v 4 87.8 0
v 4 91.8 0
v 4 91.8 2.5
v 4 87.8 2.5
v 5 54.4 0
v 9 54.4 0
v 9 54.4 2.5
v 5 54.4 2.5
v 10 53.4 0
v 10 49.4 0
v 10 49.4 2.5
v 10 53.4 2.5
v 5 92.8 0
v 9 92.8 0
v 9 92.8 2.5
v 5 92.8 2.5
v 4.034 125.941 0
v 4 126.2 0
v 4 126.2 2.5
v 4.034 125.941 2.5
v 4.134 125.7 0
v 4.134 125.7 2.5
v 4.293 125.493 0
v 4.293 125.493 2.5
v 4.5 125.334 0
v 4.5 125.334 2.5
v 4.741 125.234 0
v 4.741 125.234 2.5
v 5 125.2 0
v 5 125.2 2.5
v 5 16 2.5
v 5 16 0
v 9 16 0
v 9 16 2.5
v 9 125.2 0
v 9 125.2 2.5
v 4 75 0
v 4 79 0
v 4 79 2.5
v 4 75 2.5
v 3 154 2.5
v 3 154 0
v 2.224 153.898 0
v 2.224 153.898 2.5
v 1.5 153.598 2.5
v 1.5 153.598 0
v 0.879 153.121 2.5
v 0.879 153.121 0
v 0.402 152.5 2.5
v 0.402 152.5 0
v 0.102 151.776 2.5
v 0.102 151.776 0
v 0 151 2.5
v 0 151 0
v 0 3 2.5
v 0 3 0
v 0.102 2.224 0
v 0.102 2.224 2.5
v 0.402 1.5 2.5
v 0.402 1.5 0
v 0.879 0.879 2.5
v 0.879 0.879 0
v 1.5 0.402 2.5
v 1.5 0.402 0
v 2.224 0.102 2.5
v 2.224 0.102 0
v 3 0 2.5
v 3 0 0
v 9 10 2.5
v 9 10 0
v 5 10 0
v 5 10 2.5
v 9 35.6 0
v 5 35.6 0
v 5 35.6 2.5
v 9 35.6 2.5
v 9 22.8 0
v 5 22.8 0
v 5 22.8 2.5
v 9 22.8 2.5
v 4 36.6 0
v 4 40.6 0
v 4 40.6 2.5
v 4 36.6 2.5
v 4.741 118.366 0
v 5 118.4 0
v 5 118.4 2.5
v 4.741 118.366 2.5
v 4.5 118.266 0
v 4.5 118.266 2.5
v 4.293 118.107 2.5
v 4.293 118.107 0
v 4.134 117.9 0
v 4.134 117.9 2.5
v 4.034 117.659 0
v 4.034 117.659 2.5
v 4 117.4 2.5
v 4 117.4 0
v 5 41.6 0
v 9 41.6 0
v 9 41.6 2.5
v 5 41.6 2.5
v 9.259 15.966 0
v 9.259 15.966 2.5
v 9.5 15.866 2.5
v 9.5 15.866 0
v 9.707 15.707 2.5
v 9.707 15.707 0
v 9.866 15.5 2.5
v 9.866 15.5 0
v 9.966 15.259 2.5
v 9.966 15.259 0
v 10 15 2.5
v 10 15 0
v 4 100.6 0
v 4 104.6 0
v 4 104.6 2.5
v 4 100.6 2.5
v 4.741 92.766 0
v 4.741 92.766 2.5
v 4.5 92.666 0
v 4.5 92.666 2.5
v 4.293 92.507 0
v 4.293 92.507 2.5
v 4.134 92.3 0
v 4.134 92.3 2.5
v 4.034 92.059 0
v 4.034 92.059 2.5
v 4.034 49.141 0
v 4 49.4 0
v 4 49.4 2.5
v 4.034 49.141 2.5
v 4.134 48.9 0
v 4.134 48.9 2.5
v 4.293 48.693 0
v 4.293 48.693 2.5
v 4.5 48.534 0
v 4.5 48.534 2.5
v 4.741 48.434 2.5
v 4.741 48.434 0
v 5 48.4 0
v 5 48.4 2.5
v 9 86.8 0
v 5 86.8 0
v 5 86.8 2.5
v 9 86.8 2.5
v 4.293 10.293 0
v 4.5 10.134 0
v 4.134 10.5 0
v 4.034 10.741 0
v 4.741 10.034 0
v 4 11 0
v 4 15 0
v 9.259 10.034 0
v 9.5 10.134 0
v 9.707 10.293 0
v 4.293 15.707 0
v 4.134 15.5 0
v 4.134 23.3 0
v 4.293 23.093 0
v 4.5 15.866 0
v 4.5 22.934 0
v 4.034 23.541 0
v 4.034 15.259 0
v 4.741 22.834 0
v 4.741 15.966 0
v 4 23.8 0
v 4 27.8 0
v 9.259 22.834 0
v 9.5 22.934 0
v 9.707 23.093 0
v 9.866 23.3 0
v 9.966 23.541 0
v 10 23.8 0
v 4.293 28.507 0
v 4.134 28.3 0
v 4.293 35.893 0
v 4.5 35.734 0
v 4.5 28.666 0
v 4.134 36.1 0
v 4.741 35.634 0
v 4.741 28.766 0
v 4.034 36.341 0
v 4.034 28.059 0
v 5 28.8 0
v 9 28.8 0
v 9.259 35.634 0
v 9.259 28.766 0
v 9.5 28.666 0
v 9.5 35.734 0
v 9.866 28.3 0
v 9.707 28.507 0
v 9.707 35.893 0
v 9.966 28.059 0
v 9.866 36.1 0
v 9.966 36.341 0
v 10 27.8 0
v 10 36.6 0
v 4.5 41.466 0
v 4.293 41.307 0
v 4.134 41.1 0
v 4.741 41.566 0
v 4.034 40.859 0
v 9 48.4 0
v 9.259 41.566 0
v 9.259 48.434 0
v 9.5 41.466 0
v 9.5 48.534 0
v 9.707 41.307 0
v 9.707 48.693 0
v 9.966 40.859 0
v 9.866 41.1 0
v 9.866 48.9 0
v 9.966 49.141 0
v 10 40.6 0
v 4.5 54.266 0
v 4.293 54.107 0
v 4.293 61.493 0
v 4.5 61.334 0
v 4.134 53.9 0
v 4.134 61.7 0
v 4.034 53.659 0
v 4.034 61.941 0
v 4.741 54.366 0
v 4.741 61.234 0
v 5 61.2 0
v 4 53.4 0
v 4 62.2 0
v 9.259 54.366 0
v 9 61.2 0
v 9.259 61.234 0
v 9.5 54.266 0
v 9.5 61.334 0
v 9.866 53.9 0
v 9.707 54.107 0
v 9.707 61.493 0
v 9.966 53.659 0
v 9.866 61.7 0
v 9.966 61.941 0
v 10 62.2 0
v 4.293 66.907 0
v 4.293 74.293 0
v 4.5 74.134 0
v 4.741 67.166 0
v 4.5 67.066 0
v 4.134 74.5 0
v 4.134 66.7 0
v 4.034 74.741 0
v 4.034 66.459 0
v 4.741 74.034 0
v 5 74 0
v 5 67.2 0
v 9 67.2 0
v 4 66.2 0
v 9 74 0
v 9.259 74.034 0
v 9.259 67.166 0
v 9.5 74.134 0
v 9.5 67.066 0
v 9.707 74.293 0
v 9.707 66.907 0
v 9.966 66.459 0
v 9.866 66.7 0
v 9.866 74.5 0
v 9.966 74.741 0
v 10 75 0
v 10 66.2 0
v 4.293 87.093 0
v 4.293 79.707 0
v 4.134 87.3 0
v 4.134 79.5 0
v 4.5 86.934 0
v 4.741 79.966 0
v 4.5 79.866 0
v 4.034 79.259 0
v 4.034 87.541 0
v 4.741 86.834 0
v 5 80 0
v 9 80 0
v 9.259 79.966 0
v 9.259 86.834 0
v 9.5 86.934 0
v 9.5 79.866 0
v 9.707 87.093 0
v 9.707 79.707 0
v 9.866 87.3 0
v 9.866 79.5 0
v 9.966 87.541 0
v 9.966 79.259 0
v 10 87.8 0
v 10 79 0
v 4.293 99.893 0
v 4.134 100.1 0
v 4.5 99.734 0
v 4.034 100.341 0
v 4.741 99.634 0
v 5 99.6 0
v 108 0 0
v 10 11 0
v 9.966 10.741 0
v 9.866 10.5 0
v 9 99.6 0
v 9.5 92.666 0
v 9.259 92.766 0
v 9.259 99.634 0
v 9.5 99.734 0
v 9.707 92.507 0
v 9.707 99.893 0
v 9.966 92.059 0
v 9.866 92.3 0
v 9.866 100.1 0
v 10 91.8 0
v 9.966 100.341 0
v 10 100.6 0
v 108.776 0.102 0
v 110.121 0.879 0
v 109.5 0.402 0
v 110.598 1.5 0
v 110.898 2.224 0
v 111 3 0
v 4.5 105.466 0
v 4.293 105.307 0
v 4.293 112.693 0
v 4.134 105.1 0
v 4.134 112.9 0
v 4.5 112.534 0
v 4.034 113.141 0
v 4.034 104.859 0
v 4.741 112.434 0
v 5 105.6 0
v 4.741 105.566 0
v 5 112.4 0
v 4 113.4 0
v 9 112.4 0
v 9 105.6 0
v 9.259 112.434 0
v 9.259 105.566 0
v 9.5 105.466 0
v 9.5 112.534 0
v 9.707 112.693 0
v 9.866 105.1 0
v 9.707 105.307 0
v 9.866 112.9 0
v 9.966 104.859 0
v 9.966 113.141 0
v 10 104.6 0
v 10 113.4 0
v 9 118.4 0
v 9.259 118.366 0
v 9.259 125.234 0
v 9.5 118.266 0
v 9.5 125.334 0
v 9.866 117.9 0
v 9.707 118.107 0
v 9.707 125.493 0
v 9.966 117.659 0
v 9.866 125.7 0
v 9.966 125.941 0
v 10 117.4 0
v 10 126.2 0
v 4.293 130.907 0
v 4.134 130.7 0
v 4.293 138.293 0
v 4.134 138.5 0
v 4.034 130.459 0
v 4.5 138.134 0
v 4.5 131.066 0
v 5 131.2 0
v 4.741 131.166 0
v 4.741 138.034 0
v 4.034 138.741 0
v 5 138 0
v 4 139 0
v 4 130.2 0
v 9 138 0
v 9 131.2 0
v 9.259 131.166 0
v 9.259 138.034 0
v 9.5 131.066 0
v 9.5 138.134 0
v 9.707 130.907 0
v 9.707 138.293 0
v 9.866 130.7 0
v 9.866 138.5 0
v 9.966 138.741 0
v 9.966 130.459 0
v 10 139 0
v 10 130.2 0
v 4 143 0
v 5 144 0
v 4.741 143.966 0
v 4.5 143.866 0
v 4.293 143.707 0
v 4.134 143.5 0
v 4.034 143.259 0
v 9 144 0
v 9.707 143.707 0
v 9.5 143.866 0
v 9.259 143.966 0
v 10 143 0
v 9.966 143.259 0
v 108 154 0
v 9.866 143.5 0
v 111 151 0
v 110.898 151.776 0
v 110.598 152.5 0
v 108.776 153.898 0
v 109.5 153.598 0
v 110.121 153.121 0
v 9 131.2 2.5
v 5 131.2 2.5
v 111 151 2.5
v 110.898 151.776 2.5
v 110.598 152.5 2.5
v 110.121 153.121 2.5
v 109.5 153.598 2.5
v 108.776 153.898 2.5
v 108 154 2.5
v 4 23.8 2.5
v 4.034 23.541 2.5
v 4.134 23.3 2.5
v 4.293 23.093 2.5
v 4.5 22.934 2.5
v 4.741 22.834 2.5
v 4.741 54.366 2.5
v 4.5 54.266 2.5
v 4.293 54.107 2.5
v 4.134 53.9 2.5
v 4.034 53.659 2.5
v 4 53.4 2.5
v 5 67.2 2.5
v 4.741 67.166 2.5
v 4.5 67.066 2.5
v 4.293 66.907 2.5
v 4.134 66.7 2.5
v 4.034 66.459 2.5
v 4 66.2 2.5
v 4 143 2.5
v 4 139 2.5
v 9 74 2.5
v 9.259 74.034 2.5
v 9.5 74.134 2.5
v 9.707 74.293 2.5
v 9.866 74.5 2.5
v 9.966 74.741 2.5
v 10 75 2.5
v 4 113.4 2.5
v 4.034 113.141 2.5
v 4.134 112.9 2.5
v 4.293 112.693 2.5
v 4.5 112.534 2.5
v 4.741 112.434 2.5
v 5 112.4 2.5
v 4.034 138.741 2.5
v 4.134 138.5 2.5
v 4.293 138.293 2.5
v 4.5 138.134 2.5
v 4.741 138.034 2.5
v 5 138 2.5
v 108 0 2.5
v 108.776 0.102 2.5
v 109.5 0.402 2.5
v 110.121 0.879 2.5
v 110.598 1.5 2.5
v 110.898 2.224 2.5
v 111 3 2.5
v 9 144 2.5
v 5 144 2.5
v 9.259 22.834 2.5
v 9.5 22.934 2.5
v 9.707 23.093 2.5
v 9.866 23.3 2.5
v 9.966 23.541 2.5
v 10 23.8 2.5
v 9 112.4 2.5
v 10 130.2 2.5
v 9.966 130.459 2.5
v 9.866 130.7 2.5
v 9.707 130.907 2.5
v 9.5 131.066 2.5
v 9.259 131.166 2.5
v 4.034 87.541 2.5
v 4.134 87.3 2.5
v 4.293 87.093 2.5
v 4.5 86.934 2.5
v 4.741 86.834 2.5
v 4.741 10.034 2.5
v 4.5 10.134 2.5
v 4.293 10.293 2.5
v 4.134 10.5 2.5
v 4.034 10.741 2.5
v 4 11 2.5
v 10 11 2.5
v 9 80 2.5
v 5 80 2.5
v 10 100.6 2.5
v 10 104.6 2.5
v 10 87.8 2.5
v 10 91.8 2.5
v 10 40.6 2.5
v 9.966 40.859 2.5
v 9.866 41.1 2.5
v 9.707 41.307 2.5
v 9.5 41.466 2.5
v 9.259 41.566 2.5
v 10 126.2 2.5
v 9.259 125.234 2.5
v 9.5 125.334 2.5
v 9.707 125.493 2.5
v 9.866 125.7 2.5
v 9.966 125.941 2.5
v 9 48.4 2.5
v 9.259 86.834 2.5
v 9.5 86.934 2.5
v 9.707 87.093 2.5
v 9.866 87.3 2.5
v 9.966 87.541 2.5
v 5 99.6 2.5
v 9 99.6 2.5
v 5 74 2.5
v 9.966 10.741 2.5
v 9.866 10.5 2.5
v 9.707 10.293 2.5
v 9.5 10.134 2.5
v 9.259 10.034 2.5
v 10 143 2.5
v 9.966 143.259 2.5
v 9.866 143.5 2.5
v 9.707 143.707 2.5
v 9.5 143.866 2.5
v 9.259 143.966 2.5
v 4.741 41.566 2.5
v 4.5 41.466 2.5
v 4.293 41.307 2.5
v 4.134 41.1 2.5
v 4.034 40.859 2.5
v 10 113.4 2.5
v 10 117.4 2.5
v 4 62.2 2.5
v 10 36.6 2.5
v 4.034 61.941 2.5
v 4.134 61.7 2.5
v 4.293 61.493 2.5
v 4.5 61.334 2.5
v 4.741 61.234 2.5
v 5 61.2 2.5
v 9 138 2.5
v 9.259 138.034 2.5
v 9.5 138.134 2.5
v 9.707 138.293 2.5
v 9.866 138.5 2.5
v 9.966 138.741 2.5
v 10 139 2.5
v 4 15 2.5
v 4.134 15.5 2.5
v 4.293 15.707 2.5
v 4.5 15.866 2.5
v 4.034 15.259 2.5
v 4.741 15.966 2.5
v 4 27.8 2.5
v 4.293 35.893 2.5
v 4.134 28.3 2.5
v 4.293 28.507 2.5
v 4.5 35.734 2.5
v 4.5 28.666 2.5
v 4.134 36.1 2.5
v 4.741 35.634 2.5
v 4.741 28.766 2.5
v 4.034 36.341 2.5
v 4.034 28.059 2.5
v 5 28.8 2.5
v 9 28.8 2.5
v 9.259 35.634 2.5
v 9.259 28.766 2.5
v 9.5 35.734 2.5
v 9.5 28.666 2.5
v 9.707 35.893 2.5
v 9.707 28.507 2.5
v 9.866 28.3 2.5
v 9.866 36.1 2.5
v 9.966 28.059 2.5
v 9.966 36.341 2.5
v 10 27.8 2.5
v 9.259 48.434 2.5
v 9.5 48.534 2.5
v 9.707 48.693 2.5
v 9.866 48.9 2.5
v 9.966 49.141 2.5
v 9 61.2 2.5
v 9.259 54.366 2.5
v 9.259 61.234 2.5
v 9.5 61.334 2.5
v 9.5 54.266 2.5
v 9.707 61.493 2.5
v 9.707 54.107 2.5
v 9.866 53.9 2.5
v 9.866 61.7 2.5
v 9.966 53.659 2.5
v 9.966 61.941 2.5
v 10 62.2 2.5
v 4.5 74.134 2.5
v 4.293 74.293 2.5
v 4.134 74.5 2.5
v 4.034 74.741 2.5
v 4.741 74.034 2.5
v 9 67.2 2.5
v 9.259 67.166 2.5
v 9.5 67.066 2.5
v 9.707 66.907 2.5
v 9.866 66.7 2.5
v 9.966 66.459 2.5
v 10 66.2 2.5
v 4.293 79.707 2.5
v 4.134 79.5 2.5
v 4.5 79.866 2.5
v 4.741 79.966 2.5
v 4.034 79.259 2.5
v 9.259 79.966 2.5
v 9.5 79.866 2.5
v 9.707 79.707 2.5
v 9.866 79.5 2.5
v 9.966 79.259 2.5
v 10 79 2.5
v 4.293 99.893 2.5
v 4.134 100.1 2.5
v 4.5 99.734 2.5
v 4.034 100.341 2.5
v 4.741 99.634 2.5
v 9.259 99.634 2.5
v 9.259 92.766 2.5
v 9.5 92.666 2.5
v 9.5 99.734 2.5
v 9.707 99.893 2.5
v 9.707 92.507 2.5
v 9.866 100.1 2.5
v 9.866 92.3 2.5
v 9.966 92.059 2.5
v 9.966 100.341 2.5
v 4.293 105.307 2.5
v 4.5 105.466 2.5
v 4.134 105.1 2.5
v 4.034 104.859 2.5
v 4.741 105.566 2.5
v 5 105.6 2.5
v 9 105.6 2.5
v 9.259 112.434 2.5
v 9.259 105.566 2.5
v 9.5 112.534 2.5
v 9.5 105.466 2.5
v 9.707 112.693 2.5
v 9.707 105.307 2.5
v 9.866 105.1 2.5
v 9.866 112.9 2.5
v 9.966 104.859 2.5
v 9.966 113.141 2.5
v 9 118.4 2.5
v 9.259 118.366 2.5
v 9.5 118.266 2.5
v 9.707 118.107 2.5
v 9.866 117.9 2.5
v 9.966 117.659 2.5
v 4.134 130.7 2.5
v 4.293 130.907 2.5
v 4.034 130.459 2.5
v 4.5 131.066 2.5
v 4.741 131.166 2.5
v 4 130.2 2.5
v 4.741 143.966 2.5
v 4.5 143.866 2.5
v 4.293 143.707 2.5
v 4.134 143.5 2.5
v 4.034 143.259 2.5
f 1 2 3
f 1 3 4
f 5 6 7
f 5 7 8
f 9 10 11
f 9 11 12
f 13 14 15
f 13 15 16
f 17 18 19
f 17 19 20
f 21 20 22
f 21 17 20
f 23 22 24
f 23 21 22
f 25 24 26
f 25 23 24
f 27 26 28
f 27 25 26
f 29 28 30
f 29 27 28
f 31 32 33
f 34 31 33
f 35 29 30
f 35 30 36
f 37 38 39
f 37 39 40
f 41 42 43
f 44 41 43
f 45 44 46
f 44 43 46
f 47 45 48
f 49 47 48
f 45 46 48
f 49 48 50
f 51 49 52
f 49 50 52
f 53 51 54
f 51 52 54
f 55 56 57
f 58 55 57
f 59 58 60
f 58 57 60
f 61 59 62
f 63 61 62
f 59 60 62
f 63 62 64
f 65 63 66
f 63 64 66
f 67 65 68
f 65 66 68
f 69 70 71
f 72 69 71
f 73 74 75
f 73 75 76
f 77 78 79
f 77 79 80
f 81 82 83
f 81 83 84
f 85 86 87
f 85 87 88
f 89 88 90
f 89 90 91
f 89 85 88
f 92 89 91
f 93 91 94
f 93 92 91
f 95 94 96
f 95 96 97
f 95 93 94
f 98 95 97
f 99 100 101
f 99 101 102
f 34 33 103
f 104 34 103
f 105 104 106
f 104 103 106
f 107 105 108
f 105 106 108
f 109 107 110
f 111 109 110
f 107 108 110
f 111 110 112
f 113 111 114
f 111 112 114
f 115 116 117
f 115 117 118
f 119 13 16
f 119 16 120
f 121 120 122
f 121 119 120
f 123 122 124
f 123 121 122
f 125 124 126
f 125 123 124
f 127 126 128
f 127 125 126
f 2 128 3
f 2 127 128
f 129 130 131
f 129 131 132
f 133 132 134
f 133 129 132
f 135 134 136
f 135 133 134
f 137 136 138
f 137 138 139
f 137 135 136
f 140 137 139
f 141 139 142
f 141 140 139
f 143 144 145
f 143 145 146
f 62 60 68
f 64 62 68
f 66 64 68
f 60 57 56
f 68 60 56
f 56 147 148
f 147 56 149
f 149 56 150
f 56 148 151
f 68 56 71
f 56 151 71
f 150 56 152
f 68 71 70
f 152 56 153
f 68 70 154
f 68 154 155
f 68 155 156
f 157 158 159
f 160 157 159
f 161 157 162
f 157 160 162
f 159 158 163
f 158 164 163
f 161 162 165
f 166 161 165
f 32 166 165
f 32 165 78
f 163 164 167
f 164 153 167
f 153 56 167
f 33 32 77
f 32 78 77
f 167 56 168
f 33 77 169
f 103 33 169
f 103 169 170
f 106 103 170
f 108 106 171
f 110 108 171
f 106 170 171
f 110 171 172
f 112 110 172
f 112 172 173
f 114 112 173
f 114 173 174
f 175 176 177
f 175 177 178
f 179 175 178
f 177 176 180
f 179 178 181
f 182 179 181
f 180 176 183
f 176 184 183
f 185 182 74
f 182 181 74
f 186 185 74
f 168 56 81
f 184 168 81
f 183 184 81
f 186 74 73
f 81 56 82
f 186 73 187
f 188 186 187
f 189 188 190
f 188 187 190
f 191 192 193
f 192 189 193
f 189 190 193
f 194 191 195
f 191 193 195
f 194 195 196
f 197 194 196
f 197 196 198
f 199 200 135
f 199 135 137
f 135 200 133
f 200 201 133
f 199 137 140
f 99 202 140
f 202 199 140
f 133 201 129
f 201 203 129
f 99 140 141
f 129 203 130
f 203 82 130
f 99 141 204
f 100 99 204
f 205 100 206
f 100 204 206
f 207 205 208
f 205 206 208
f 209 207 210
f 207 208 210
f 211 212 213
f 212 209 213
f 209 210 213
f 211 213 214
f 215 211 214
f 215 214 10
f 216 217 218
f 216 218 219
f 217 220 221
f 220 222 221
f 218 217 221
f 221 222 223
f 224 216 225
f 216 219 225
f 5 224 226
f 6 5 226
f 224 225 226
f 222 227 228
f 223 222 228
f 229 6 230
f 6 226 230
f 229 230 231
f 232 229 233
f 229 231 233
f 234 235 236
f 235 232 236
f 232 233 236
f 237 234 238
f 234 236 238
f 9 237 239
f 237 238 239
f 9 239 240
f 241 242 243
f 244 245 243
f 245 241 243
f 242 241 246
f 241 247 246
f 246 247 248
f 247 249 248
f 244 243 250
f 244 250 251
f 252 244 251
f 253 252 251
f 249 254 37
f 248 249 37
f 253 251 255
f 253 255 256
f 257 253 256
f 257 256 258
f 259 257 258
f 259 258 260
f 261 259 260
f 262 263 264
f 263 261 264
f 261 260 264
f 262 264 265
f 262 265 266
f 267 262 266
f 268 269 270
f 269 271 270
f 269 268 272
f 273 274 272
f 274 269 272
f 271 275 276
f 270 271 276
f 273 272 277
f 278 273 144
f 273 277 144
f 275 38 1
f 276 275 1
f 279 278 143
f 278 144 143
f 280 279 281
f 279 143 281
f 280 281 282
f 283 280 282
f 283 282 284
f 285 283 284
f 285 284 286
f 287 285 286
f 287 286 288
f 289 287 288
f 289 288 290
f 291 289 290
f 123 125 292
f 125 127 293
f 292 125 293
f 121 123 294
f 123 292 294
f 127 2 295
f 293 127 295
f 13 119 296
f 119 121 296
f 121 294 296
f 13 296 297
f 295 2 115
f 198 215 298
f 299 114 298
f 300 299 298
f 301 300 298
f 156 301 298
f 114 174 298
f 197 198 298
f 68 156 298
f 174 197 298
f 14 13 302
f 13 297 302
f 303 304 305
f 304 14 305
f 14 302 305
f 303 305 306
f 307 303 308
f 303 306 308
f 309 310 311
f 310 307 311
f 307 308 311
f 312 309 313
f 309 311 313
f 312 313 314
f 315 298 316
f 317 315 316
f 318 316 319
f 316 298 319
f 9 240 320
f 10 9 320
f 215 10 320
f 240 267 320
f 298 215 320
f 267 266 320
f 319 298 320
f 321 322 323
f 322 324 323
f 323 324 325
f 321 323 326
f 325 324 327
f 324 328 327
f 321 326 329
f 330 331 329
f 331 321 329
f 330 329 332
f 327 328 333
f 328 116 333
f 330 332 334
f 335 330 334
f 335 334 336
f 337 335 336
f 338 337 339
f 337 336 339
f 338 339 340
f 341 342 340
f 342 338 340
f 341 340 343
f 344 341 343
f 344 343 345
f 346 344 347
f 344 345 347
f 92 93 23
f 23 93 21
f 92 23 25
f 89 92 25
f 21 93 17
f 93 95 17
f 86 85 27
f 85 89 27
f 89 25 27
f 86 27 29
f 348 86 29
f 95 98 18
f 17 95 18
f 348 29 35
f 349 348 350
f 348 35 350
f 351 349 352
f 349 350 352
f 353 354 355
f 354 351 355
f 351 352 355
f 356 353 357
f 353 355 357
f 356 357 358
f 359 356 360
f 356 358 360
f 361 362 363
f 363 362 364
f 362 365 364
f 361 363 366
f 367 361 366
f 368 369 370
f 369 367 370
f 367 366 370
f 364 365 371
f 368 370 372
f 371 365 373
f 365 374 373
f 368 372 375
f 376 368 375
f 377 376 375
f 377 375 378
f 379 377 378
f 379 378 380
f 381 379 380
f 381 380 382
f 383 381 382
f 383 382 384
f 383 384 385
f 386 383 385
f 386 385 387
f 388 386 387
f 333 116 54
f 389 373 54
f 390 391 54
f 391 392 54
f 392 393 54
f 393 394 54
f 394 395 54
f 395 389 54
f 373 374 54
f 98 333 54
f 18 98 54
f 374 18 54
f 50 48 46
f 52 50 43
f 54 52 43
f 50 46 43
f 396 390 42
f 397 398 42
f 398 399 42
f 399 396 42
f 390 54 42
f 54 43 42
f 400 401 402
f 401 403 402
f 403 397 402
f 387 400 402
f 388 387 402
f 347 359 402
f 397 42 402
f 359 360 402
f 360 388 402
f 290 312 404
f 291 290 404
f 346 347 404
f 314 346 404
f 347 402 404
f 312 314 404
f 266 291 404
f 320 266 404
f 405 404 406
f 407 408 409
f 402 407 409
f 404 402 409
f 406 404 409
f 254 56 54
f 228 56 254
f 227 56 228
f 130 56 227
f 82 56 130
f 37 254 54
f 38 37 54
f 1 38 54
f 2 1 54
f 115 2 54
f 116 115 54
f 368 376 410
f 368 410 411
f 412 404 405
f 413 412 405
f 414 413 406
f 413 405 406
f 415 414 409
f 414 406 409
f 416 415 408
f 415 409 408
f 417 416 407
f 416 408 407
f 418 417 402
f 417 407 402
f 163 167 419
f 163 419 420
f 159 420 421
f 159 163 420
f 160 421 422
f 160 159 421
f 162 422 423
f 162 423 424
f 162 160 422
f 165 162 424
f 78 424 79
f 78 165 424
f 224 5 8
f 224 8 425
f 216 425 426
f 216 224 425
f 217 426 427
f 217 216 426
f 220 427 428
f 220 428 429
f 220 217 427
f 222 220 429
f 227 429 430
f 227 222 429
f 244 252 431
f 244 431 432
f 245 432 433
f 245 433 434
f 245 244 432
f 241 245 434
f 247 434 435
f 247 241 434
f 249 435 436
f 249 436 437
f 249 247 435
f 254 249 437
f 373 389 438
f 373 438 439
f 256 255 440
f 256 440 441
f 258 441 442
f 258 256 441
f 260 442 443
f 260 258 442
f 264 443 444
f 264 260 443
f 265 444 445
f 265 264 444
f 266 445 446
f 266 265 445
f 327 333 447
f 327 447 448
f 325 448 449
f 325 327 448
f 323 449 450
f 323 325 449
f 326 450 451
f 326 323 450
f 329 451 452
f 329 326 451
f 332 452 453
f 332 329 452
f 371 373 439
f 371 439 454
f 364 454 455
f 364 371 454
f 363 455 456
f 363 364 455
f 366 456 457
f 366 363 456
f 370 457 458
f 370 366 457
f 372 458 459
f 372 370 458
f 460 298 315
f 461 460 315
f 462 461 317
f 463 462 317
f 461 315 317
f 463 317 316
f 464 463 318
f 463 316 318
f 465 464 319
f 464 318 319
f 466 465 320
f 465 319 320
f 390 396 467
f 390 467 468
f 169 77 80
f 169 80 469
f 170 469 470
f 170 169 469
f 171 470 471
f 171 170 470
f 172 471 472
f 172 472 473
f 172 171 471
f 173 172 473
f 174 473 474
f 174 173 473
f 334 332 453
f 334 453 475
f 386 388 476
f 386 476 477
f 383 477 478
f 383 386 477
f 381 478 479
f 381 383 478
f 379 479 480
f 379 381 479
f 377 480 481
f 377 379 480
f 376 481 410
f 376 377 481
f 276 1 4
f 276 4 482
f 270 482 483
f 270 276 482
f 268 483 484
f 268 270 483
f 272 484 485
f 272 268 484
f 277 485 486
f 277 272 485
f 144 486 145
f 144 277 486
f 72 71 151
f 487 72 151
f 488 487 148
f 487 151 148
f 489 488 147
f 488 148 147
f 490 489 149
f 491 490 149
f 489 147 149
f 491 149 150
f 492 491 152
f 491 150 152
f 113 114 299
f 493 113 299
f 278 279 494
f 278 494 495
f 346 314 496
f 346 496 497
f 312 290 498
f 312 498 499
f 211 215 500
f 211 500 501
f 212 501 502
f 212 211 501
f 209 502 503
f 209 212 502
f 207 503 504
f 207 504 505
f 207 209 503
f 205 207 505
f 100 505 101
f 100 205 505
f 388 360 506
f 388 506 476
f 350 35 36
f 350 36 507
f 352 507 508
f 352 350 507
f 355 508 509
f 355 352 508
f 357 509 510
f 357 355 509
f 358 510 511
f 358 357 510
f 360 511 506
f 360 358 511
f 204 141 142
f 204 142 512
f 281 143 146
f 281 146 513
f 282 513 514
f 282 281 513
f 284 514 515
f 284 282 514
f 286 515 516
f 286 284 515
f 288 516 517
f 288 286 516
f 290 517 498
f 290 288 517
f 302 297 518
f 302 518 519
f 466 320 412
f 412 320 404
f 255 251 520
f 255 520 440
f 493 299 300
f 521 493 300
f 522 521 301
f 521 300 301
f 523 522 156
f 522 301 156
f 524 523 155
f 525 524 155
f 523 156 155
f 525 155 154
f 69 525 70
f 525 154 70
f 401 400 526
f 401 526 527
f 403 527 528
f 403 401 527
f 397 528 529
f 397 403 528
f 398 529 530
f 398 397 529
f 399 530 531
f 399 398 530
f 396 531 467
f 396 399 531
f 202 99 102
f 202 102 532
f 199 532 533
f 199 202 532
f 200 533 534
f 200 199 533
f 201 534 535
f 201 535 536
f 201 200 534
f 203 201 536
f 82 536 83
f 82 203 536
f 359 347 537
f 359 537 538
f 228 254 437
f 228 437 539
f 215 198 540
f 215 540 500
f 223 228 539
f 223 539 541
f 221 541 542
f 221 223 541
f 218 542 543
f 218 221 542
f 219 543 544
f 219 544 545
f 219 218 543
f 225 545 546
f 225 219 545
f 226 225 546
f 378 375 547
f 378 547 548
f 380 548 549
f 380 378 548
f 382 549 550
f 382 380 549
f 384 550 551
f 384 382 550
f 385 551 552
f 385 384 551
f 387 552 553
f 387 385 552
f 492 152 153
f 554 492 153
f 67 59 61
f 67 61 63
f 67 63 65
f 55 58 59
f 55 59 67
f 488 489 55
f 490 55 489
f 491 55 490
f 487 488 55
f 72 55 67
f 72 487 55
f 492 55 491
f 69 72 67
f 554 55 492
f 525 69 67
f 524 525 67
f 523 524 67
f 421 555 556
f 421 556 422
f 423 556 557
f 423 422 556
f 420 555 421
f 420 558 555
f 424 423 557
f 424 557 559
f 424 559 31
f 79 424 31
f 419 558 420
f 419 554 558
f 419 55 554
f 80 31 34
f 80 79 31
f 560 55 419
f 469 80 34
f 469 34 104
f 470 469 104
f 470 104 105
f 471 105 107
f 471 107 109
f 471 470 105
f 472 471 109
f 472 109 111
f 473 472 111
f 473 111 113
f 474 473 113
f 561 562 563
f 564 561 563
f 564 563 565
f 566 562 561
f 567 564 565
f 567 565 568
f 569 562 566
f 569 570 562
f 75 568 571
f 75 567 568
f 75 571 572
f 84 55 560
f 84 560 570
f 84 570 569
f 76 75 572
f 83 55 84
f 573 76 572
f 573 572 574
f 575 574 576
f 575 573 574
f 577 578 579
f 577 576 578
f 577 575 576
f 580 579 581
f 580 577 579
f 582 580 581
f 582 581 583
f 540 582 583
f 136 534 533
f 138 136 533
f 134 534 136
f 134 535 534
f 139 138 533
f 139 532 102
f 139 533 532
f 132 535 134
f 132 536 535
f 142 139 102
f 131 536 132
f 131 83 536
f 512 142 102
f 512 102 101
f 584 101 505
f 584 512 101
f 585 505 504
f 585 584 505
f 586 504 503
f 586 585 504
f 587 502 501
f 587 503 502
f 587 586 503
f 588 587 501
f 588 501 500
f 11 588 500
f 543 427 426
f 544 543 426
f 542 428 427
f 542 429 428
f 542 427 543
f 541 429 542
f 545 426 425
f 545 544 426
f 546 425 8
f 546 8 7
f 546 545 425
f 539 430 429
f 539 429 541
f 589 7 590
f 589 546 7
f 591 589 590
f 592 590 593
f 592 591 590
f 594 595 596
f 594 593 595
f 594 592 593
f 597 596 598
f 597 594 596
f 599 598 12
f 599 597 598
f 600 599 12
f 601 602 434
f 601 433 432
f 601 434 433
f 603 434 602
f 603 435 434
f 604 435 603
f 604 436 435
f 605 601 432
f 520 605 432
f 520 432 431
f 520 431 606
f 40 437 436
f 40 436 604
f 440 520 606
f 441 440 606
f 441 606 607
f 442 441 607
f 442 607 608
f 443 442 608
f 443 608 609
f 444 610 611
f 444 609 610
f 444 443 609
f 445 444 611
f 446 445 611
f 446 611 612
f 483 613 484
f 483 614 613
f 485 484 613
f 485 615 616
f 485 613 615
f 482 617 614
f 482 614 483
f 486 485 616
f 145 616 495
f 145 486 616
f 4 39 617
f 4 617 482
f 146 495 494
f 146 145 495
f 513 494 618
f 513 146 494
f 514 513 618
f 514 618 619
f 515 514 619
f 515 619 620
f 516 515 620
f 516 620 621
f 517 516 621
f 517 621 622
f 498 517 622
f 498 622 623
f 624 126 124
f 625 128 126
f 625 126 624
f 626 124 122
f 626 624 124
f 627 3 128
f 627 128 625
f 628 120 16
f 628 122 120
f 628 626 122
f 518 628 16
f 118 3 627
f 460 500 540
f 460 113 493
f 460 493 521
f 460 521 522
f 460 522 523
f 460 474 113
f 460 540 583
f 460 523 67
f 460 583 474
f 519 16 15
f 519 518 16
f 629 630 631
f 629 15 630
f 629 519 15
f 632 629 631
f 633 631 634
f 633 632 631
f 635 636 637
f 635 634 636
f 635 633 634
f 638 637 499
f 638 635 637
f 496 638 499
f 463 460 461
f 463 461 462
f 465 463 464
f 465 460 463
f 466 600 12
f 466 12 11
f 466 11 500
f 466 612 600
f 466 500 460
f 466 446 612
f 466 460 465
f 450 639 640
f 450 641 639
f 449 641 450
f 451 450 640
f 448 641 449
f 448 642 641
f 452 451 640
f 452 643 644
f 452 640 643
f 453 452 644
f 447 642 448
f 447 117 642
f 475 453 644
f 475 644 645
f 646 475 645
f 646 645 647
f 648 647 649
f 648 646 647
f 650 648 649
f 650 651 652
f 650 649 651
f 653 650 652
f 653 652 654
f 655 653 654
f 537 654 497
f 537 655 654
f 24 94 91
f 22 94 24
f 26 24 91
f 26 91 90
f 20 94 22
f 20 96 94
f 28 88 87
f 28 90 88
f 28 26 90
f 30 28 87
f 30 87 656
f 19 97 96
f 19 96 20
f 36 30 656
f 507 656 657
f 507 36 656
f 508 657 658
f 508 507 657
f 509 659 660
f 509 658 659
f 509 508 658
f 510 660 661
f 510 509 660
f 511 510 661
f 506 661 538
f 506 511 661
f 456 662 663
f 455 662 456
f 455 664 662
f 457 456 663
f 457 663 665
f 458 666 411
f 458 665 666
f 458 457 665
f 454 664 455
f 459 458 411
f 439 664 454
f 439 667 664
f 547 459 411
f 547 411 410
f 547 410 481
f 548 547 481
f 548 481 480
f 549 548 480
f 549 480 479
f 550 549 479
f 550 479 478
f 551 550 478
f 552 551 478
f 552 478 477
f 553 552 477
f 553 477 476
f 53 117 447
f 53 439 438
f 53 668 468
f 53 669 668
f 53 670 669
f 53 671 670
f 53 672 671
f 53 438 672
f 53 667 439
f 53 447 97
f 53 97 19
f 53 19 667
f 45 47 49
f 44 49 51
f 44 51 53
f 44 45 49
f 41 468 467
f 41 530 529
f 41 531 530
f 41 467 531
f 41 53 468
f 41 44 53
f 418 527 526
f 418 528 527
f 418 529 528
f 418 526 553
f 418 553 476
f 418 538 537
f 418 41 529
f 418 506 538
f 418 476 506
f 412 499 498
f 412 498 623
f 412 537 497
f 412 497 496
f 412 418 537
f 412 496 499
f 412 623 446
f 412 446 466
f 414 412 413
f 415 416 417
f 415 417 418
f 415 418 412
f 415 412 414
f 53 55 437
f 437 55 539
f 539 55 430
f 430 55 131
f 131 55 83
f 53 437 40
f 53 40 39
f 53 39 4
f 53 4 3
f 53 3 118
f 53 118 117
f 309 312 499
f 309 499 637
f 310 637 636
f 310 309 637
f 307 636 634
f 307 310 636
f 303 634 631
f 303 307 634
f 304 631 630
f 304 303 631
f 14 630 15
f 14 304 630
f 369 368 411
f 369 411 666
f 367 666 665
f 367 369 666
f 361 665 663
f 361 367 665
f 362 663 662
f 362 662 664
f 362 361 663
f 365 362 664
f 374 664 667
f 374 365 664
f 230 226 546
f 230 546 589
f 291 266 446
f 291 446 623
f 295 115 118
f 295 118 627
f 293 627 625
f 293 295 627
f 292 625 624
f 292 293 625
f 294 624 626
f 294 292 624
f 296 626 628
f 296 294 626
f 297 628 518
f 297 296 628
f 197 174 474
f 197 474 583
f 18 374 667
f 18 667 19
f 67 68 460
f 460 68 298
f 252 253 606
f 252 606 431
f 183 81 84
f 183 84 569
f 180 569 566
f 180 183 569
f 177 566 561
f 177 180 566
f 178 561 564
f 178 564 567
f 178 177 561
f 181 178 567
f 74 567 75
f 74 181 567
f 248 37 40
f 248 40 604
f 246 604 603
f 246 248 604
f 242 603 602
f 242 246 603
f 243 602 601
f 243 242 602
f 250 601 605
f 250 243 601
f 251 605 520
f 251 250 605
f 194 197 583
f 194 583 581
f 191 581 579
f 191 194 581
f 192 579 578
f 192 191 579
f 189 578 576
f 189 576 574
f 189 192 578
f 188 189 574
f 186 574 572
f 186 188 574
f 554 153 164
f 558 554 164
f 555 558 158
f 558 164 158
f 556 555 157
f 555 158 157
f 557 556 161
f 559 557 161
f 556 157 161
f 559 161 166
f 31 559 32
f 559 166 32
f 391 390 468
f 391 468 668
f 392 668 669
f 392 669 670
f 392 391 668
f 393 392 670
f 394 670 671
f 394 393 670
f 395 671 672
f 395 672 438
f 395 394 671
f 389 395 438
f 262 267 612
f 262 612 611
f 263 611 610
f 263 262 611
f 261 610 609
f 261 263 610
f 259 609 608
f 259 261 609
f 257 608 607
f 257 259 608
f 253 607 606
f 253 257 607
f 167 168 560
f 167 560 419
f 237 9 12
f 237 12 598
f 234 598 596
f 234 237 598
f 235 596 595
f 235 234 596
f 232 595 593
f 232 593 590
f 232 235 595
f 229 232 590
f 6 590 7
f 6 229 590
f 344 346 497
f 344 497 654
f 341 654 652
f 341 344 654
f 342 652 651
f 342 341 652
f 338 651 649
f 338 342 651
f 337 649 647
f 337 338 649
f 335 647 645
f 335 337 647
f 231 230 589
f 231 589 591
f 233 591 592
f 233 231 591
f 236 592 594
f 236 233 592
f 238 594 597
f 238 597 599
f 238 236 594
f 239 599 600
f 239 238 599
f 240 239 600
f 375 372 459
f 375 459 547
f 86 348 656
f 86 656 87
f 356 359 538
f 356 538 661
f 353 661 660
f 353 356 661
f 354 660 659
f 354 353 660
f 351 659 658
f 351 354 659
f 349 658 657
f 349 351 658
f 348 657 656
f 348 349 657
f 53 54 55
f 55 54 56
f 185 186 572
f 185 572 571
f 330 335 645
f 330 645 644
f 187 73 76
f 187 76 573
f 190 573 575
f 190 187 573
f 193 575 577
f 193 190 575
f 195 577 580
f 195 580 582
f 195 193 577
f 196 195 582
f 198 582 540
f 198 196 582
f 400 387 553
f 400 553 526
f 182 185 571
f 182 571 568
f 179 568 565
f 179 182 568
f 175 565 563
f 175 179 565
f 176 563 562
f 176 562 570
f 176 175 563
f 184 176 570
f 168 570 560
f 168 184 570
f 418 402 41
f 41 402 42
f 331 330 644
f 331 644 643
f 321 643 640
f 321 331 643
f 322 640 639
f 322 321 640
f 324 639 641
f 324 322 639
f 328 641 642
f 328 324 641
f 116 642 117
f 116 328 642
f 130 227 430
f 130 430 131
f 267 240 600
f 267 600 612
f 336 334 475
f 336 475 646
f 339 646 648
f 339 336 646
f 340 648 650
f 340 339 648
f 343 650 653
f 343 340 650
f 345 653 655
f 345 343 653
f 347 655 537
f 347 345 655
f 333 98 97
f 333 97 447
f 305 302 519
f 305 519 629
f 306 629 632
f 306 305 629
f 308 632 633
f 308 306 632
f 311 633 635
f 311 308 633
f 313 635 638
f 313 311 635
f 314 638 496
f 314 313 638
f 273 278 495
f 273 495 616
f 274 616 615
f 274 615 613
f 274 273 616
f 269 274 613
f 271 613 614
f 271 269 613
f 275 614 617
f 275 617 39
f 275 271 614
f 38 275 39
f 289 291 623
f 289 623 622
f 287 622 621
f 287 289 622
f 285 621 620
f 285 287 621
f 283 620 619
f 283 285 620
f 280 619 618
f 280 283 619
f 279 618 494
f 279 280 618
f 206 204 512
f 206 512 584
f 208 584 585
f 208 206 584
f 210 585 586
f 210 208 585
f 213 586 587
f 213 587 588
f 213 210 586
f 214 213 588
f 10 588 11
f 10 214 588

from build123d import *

# Parameters (mm, degrees)
BOSS_EXTRUDE1_DEPTH = 2.5


with BuildPart() as part:
    # Sketch1 → Boss-Extrude1 (new body)
    with BuildSketch(Plane.XY):
        with BuildLine():
            Line((3, 0), (108, 0))
            ThreePointArc((108, 0), (110.121320344, 0.878679656), (111, 3))
            Line((111, 3), (111, 151))
            ThreePointArc((111, 151), (110.121320344, 153.121320344), (108, 154))
            Line((108, 154), (3, 154))
            ThreePointArc((3, 154), (0.878679656, 153.121320344), (0, 151))
            Line((0, 151), (0, 3))
            ThreePointArc((0, 3), (0.878679656, 0.878679656), (3, 0))
        make_face()
        with BuildLine():
            Line((5, 22.8), (9, 22.8))
            ThreePointArc((9, 22.8), (9.707106781, 23.092893219), (10, 23.8))
            Line((10, 23.8), (10, 27.8))
            ThreePointArc((10, 27.8), (9.707106781, 28.507106781), (9, 28.8))
            Line((9, 28.8), (5, 28.8))
            ThreePointArc((5, 28.8), (4.292893219, 28.507106781), (4, 27.8))
            Line((4, 27.8), (4, 23.8))
            ThreePointArc((4, 23.8), (4.292893219, 23.092893219), (5, 22.8))
        make_face(mode=Mode.SUBTRACT)
        with BuildLine():
            Line((5, 16), (9, 16))
            ThreePointArc((9, 16), (9.707106781, 15.707106781), (10, 15))
            Line((10, 15), (10, 11))
            ThreePointArc((10, 11), (9.707106781, 10.292893219), (9, 10))
            Line((9, 10), (5, 10))
            ThreePointArc((5, 10), (4.292893219, 10.292893219), (4, 11))
            Line((4, 11), (4, 15))
            ThreePointArc((4, 15), (4.292893219, 15.707106781), (5, 16))
        make_face(mode=Mode.SUBTRACT)
        with BuildLine():
            Line((5, 35.6), (9, 35.6))
            ThreePointArc((9, 35.6), (9.707106781, 35.892893219), (10, 36.6))
            Line((10, 36.6), (10, 40.6))
            ThreePointArc((10, 40.6), (9.707106781, 41.307106781), (9, 41.6))
            Line((9, 41.6), (5, 41.6))
            ThreePointArc((5, 41.6), (4.292893219, 41.307106781), (4, 40.6))
            Line((4, 40.6), (4, 36.6))
            ThreePointArc((4, 36.6), (4.292893219, 35.892893219), (5, 35.6))
        make_face(mode=Mode.SUBTRACT)
        with BuildLine():
            Line((5, 48.4), (9, 48.4))
            ThreePointArc((9, 48.4), (9.707106781, 48.692893219), (10, 49.4))
            Line((10, 49.4), (10, 53.4))
            ThreePointArc((10, 53.4), (9.707106781, 54.107106781), (9, 54.4))
            Line((9, 54.4), (5, 54.4))
            ThreePointArc((5, 54.4), (4.292893219, 54.107106781), (4, 53.4))
            Line((4, 53.4), (4, 49.4))
            ThreePointArc((4, 49.4), (4.292893219, 48.692893219), (5, 48.4))
        make_face(mode=Mode.SUBTRACT)
        with BuildLine():
            Line((5, 61.2), (9, 61.2))
            ThreePointArc((9, 61.2), (9.707106781, 61.492893219), (10, 62.2))
            Line((10, 62.2), (10, 66.2))
            ThreePointArc((10, 66.2), (9.707106781, 66.907106781), (9, 67.2))
            Line((9, 67.2), (5, 67.2))
            ThreePointArc((5, 67.2), (4.292893219, 66.907106781), (4, 66.2))
            Line((4, 66.2), (4, 62.2))
            ThreePointArc((4, 62.2), (4.292893219, 61.492893219), (5, 61.2))
        make_face(mode=Mode.SUBTRACT)
        with BuildLine():
            Line((5, 74), (9, 74))
            ThreePointArc((9, 74), (9.707106781, 74.292893219), (10, 75))
            Line((10, 75), (10, 79))
            ThreePointArc((10, 79), (9.707106781, 79.707106781), (9, 80))
            Line((9, 80), (5, 80))
            ThreePointArc((5, 80), (4.292893219, 79.707106781), (4, 79))
            Line((4, 79), (4, 75))
            ThreePointArc((4, 75), (4.292893219, 74.292893219), (5, 74))
        make_face(mode=Mode.SUBTRACT)
        with BuildLine():
            Line((5, 86.8), (9, 86.8))
            ThreePointArc((9, 86.8), (9.707106781, 87.092893219), (10, 87.8))
            Line((10, 87.8), (10, 91.8))
            ThreePointArc((10, 91.8), (9.707106781, 92.507106781), (9, 92.8))
            Line((9, 92.8), (5, 92.8))
            ThreePointArc((5, 92.8), (4.292893219, 92.507106781), (4, 91.8))
            Line((4, 91.8), (4, 87.8))
            ThreePointArc((4, 87.8), (4.292893219, 87.092893219), (5, 86.8))
        make_face(mode=Mode.SUBTRACT)
        with BuildLine():
            Line((5, 99.6), (9, 99.6))
            ThreePointArc((9, 99.6), (9.707106781, 99.892893219), (10, 100.6))
            Line((10, 100.6), (10, 104.6))
            ThreePointArc((10, 104.6), (9.707106781, 105.307106781), (9, 105.6))
            Line((9, 105.6), (5, 105.6))
            ThreePointArc((5, 105.6), (4.292893219, 105.307106781), (4, 104.6))
            Line((4, 104.6), (4, 100.6))
            ThreePointArc((4, 100.6), (4.292893219, 99.892893219), (5, 99.6))
        make_face(mode=Mode.SUBTRACT)
        with BuildLine():
            Line((5, 112.4), (9, 112.4))
            ThreePointArc((9, 112.4), (9.707106781, 112.692893219), (10, 113.4))
            Line((10, 113.4), (10, 117.4))
            ThreePointArc((10, 117.4), (9.707106781, 118.107106781), (9, 118.4))
            Line((9, 118.4), (5, 118.4))
            ThreePointArc((5, 118.4), (4.292893219, 118.107106781), (4, 117.4))
            Line((4, 117.4), (4, 113.4))
            ThreePointArc((4, 113.4), (4.292893219, 112.692893219), (5, 112.4))
        make_face(mode=Mode.SUBTRACT)
        with BuildLine():
            Line((5, 125.2), (9, 125.2))
            ThreePointArc((9, 125.2), (9.707106781, 125.492893219), (10, 126.2))
            Line((10, 126.2), (10, 130.2))
            ThreePointArc((10, 130.2), (9.707106781, 130.907106781), (9, 131.2))
            Line((9, 131.2), (5, 131.2))
            ThreePointArc((5, 131.2), (4.292893219, 130.907106781), (4, 130.2))
            Line((4, 130.2), (4, 126.2))
            ThreePointArc((4, 126.2), (4.292893219, 125.492893219), (5, 125.2))
        make_face(mode=Mode.SUBTRACT)
        with BuildLine():
            Line((5, 138), (9, 138))
            ThreePointArc((9, 138), (9.707106781, 138.292893219), (10, 139))
            Line((10, 139), (10, 143))
            ThreePointArc((10, 143), (9.707106781, 143.707106781), (9, 144))
            Line((9, 144), (5, 144))
            ThreePointArc((5, 144), (4.292893219, 143.707106781), (4, 143))
            Line((4, 143), (4, 139))
            ThreePointArc((4, 139), (4.292893219, 138.292893219), (5, 138))
        make_face(mode=Mode.SUBTRACT)
    extrude(amount=BOSS_EXTRUDE1_DEPTH)


solid = part.part
